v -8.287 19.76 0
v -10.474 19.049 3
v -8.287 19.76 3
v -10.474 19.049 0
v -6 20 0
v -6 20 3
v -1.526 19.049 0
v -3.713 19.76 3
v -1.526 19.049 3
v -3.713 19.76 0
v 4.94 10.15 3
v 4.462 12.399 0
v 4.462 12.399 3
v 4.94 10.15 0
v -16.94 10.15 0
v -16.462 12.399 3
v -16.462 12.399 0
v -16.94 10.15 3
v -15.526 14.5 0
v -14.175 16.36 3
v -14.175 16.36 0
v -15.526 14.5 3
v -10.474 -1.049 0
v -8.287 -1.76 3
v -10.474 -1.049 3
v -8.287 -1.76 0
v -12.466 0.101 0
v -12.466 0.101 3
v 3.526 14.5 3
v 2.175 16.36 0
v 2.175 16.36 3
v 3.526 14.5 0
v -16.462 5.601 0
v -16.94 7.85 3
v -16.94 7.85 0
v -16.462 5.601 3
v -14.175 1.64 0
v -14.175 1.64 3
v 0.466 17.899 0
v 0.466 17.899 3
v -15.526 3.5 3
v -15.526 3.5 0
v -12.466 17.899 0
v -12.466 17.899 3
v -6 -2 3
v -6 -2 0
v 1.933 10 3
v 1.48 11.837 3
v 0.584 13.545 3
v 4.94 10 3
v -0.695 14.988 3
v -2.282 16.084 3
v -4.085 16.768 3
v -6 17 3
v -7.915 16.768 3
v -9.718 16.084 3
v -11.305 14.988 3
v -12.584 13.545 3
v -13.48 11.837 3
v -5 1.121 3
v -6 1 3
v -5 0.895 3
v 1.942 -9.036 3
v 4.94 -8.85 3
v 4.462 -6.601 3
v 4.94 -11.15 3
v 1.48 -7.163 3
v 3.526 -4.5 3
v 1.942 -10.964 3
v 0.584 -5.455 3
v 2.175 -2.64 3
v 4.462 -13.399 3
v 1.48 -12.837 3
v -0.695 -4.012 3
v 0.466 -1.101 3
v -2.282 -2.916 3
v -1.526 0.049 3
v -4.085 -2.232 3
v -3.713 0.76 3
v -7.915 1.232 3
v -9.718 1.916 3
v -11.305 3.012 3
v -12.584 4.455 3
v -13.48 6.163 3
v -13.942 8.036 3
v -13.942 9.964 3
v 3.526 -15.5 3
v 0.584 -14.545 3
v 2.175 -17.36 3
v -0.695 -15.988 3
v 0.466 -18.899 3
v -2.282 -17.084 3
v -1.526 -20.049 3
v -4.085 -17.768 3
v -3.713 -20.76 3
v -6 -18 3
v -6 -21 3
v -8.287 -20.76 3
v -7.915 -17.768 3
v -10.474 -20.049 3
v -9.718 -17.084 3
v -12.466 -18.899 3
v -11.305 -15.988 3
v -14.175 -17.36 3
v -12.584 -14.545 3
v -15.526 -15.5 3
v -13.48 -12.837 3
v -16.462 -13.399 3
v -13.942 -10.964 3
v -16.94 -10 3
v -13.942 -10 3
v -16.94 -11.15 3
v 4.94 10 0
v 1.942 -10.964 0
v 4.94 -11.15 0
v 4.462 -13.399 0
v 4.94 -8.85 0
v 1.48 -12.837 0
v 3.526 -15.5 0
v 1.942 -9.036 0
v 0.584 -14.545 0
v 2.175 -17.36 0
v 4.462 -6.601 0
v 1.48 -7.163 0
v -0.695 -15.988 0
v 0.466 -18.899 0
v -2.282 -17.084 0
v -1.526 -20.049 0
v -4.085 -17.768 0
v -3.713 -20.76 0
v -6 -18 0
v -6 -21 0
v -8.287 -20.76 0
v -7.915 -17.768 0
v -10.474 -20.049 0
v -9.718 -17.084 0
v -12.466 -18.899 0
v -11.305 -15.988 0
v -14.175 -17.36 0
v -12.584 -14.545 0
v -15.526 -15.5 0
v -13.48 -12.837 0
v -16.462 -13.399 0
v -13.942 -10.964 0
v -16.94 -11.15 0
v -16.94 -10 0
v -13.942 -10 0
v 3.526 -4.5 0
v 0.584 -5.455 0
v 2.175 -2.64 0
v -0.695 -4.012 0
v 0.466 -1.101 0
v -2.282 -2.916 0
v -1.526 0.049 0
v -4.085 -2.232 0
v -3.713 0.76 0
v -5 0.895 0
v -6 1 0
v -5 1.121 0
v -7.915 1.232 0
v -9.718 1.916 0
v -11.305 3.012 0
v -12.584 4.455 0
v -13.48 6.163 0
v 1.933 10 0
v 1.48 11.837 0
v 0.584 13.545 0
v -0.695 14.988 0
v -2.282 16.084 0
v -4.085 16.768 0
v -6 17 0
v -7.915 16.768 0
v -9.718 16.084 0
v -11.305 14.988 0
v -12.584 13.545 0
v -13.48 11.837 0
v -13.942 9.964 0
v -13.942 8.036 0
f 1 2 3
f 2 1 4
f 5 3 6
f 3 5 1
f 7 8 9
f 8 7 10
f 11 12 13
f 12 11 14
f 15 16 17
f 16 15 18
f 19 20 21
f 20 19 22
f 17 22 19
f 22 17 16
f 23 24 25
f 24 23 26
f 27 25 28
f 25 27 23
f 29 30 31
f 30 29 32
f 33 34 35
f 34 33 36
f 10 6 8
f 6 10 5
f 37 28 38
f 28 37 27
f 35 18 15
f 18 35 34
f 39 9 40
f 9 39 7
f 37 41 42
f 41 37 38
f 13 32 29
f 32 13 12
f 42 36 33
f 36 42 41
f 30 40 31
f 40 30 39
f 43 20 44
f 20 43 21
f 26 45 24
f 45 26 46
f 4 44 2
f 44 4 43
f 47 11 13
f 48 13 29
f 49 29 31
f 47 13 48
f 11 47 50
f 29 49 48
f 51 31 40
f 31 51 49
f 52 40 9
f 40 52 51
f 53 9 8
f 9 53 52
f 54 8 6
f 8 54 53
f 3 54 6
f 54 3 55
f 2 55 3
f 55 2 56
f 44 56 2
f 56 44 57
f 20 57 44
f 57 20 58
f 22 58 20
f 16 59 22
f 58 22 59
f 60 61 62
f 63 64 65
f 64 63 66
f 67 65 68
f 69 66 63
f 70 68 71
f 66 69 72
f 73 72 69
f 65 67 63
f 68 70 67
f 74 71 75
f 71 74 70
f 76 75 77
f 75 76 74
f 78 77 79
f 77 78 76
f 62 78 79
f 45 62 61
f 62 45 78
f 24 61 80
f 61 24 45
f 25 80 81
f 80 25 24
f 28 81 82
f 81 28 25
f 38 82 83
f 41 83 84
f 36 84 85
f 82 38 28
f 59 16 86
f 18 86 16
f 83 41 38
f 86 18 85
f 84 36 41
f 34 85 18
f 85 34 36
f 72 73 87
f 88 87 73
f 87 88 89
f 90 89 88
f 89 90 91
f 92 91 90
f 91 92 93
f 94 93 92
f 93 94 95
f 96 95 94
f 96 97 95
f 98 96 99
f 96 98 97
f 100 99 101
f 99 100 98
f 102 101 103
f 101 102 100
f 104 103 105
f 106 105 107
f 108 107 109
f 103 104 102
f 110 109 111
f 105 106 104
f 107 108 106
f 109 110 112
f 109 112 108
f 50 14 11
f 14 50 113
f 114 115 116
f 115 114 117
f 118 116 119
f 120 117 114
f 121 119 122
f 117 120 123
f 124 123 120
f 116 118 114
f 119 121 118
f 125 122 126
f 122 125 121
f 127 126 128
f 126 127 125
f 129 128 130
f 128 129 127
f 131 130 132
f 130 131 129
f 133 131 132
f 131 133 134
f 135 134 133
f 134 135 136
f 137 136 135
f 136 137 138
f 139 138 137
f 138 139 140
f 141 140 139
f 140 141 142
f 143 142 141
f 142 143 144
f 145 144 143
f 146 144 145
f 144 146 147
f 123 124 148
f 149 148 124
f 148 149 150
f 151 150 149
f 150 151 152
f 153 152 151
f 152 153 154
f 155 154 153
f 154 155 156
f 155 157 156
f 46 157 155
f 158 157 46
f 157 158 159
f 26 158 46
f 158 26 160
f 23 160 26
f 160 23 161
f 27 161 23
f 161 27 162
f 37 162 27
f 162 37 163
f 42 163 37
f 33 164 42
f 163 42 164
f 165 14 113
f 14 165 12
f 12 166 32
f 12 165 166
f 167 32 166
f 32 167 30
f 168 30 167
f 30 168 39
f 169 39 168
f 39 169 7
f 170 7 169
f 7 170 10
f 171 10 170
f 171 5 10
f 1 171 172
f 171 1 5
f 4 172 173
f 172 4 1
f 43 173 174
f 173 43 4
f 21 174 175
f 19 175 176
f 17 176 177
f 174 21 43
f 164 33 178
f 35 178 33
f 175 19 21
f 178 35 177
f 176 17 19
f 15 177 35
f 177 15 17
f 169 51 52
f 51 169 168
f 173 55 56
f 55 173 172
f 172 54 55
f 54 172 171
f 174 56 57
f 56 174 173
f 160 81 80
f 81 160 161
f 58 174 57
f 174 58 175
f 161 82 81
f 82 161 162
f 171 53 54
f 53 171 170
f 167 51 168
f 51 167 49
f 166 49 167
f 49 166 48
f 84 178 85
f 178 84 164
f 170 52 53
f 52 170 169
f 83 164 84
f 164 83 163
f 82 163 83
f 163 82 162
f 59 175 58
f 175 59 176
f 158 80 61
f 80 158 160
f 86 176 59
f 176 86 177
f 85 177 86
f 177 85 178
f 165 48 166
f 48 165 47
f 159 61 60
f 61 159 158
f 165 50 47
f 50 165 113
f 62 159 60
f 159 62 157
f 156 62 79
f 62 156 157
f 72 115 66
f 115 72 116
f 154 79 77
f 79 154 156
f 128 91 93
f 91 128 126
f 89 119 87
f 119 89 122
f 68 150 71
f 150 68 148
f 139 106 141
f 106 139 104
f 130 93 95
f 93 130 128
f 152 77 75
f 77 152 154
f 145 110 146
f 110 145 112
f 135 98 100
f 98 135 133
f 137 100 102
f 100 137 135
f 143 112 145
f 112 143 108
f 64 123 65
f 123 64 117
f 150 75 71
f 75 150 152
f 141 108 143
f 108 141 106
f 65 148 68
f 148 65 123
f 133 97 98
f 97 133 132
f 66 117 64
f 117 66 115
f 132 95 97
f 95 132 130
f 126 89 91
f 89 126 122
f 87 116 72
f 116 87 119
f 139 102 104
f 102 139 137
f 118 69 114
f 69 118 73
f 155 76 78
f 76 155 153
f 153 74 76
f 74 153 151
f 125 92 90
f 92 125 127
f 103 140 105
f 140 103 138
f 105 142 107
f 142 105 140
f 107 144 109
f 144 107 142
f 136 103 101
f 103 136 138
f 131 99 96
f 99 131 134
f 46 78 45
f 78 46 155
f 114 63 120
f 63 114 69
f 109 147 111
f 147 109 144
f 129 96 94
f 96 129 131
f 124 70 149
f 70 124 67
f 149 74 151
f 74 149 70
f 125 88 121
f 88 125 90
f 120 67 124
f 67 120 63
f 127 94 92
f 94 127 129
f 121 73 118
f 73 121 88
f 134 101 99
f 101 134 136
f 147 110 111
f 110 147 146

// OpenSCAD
//буква S
translate([-100,0,0]) rotate([0,0,90])
union(){
difference(){
  translate([9,-94,0]) cylinder(3,11,11);
  translate([9,-94,-1]) cylinder(5,8,8);
  translate([-5,-110,-1]) cube(15);

}

difference(){
  translate([-10,-94,0]) cylinder(3,11,11);
  translate([-10,-94,-1]) cylinder(5,8,8);
  translate([-10,-94,-1]) cube(15);
}
}
